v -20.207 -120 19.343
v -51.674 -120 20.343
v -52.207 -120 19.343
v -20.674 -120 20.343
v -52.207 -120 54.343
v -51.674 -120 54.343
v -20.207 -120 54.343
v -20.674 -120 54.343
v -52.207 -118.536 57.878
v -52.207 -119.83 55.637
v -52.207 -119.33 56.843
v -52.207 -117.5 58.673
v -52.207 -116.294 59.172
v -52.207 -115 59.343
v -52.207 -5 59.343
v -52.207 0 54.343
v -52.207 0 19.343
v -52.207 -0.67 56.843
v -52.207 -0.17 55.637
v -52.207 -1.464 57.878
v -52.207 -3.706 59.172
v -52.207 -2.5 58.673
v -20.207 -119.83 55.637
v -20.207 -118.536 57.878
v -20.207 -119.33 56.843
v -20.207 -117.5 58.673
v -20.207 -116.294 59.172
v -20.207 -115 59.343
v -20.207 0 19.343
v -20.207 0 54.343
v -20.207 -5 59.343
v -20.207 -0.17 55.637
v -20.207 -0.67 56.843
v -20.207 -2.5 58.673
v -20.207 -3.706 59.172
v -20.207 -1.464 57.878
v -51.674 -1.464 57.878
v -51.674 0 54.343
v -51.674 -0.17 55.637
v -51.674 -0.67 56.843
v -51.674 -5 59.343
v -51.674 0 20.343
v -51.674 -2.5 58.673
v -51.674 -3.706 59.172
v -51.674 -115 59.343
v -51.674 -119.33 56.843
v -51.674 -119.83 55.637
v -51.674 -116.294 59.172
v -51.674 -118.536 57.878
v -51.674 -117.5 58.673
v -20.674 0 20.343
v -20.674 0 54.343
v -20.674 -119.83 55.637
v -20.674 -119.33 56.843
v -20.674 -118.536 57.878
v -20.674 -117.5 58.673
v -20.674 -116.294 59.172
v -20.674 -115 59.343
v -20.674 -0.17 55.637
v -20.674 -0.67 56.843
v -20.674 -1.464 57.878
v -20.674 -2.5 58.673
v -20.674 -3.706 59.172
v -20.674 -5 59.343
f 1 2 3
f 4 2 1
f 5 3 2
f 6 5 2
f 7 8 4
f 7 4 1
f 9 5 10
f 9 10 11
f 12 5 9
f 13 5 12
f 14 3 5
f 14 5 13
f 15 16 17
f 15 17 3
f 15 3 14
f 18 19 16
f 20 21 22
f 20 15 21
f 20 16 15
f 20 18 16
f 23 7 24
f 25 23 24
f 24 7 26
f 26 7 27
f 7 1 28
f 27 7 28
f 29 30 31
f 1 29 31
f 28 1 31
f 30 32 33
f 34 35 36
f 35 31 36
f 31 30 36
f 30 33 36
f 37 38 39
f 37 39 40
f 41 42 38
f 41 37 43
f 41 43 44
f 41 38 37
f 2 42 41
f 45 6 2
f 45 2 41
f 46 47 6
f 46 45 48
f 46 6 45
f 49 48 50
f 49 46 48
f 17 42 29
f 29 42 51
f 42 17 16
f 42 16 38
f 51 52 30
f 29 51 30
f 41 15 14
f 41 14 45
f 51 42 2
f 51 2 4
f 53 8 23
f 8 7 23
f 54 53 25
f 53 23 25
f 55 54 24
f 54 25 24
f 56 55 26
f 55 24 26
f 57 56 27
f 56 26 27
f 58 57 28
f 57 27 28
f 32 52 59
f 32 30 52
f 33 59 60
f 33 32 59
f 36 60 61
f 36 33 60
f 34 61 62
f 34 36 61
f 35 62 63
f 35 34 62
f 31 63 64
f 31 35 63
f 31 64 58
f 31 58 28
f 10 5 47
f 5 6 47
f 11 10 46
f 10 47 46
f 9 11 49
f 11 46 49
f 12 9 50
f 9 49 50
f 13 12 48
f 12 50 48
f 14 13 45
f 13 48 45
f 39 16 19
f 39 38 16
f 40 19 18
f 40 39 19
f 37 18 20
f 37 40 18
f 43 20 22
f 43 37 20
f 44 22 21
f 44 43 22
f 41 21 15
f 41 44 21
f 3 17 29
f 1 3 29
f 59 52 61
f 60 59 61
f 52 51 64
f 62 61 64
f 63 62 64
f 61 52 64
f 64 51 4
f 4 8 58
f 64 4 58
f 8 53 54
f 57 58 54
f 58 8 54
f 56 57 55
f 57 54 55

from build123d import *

# Parameters (mm, degrees)
F0_W     = 32
F0_H     = 40
F1_DEPTH = 120
F2_W     = 31
F2_H     = 39
F3_DEPTH = 120
F4_R     = 5
F5_R     = 5
F6_R     = 5
F7_R     = 5


with BuildPart() as f1:
    # F0 (on Front) → F1 (new body)
    with BuildSketch(Plane.XZ):
        with Locations((-36.2070729025, 39.3427484608)):
            Rectangle(F0_W, F0_H)
    extrude(amount=F1_DEPTH)

    # F2 (on face) → F3 (cut)
    with BuildSketch(Plane.XZ.offset(120)):
        with Locations((-36.1735836864, 39.8427484608)):
            Rectangle(F2_W, F2_H)
    extrude(amount=-F3_DEPTH, mode=Mode.SUBTRACT)

    # F4
    f4_edges = [f1.edges().sort_by_distance(p)[0] for p in [
        (-20.440328, -120, 59.342748),
    ]]
    fillet(f4_edges, radius=F4_R)

    # F5
    f5_edges = [f1.edges().sort_by_distance(p)[0] for p in [
        (-51.940328, -120, 59.342748),
    ]]
    fillet(f5_edges, radius=F5_R)

    # F6
    f6_edges = [f1.edges().sort_by_distance(p)[0] for p in [
        (-20.440328, 0, 59.342748),
    ]]
    fillet(f6_edges, radius=F6_R)

    # F7
    f7_edges = [f1.edges().sort_by_distance(p)[0] for p in [
        (-51.940328, 0, 59.342748),
    ]]
    fillet(f7_edges, radius=F7_R)


solid = f1.part
